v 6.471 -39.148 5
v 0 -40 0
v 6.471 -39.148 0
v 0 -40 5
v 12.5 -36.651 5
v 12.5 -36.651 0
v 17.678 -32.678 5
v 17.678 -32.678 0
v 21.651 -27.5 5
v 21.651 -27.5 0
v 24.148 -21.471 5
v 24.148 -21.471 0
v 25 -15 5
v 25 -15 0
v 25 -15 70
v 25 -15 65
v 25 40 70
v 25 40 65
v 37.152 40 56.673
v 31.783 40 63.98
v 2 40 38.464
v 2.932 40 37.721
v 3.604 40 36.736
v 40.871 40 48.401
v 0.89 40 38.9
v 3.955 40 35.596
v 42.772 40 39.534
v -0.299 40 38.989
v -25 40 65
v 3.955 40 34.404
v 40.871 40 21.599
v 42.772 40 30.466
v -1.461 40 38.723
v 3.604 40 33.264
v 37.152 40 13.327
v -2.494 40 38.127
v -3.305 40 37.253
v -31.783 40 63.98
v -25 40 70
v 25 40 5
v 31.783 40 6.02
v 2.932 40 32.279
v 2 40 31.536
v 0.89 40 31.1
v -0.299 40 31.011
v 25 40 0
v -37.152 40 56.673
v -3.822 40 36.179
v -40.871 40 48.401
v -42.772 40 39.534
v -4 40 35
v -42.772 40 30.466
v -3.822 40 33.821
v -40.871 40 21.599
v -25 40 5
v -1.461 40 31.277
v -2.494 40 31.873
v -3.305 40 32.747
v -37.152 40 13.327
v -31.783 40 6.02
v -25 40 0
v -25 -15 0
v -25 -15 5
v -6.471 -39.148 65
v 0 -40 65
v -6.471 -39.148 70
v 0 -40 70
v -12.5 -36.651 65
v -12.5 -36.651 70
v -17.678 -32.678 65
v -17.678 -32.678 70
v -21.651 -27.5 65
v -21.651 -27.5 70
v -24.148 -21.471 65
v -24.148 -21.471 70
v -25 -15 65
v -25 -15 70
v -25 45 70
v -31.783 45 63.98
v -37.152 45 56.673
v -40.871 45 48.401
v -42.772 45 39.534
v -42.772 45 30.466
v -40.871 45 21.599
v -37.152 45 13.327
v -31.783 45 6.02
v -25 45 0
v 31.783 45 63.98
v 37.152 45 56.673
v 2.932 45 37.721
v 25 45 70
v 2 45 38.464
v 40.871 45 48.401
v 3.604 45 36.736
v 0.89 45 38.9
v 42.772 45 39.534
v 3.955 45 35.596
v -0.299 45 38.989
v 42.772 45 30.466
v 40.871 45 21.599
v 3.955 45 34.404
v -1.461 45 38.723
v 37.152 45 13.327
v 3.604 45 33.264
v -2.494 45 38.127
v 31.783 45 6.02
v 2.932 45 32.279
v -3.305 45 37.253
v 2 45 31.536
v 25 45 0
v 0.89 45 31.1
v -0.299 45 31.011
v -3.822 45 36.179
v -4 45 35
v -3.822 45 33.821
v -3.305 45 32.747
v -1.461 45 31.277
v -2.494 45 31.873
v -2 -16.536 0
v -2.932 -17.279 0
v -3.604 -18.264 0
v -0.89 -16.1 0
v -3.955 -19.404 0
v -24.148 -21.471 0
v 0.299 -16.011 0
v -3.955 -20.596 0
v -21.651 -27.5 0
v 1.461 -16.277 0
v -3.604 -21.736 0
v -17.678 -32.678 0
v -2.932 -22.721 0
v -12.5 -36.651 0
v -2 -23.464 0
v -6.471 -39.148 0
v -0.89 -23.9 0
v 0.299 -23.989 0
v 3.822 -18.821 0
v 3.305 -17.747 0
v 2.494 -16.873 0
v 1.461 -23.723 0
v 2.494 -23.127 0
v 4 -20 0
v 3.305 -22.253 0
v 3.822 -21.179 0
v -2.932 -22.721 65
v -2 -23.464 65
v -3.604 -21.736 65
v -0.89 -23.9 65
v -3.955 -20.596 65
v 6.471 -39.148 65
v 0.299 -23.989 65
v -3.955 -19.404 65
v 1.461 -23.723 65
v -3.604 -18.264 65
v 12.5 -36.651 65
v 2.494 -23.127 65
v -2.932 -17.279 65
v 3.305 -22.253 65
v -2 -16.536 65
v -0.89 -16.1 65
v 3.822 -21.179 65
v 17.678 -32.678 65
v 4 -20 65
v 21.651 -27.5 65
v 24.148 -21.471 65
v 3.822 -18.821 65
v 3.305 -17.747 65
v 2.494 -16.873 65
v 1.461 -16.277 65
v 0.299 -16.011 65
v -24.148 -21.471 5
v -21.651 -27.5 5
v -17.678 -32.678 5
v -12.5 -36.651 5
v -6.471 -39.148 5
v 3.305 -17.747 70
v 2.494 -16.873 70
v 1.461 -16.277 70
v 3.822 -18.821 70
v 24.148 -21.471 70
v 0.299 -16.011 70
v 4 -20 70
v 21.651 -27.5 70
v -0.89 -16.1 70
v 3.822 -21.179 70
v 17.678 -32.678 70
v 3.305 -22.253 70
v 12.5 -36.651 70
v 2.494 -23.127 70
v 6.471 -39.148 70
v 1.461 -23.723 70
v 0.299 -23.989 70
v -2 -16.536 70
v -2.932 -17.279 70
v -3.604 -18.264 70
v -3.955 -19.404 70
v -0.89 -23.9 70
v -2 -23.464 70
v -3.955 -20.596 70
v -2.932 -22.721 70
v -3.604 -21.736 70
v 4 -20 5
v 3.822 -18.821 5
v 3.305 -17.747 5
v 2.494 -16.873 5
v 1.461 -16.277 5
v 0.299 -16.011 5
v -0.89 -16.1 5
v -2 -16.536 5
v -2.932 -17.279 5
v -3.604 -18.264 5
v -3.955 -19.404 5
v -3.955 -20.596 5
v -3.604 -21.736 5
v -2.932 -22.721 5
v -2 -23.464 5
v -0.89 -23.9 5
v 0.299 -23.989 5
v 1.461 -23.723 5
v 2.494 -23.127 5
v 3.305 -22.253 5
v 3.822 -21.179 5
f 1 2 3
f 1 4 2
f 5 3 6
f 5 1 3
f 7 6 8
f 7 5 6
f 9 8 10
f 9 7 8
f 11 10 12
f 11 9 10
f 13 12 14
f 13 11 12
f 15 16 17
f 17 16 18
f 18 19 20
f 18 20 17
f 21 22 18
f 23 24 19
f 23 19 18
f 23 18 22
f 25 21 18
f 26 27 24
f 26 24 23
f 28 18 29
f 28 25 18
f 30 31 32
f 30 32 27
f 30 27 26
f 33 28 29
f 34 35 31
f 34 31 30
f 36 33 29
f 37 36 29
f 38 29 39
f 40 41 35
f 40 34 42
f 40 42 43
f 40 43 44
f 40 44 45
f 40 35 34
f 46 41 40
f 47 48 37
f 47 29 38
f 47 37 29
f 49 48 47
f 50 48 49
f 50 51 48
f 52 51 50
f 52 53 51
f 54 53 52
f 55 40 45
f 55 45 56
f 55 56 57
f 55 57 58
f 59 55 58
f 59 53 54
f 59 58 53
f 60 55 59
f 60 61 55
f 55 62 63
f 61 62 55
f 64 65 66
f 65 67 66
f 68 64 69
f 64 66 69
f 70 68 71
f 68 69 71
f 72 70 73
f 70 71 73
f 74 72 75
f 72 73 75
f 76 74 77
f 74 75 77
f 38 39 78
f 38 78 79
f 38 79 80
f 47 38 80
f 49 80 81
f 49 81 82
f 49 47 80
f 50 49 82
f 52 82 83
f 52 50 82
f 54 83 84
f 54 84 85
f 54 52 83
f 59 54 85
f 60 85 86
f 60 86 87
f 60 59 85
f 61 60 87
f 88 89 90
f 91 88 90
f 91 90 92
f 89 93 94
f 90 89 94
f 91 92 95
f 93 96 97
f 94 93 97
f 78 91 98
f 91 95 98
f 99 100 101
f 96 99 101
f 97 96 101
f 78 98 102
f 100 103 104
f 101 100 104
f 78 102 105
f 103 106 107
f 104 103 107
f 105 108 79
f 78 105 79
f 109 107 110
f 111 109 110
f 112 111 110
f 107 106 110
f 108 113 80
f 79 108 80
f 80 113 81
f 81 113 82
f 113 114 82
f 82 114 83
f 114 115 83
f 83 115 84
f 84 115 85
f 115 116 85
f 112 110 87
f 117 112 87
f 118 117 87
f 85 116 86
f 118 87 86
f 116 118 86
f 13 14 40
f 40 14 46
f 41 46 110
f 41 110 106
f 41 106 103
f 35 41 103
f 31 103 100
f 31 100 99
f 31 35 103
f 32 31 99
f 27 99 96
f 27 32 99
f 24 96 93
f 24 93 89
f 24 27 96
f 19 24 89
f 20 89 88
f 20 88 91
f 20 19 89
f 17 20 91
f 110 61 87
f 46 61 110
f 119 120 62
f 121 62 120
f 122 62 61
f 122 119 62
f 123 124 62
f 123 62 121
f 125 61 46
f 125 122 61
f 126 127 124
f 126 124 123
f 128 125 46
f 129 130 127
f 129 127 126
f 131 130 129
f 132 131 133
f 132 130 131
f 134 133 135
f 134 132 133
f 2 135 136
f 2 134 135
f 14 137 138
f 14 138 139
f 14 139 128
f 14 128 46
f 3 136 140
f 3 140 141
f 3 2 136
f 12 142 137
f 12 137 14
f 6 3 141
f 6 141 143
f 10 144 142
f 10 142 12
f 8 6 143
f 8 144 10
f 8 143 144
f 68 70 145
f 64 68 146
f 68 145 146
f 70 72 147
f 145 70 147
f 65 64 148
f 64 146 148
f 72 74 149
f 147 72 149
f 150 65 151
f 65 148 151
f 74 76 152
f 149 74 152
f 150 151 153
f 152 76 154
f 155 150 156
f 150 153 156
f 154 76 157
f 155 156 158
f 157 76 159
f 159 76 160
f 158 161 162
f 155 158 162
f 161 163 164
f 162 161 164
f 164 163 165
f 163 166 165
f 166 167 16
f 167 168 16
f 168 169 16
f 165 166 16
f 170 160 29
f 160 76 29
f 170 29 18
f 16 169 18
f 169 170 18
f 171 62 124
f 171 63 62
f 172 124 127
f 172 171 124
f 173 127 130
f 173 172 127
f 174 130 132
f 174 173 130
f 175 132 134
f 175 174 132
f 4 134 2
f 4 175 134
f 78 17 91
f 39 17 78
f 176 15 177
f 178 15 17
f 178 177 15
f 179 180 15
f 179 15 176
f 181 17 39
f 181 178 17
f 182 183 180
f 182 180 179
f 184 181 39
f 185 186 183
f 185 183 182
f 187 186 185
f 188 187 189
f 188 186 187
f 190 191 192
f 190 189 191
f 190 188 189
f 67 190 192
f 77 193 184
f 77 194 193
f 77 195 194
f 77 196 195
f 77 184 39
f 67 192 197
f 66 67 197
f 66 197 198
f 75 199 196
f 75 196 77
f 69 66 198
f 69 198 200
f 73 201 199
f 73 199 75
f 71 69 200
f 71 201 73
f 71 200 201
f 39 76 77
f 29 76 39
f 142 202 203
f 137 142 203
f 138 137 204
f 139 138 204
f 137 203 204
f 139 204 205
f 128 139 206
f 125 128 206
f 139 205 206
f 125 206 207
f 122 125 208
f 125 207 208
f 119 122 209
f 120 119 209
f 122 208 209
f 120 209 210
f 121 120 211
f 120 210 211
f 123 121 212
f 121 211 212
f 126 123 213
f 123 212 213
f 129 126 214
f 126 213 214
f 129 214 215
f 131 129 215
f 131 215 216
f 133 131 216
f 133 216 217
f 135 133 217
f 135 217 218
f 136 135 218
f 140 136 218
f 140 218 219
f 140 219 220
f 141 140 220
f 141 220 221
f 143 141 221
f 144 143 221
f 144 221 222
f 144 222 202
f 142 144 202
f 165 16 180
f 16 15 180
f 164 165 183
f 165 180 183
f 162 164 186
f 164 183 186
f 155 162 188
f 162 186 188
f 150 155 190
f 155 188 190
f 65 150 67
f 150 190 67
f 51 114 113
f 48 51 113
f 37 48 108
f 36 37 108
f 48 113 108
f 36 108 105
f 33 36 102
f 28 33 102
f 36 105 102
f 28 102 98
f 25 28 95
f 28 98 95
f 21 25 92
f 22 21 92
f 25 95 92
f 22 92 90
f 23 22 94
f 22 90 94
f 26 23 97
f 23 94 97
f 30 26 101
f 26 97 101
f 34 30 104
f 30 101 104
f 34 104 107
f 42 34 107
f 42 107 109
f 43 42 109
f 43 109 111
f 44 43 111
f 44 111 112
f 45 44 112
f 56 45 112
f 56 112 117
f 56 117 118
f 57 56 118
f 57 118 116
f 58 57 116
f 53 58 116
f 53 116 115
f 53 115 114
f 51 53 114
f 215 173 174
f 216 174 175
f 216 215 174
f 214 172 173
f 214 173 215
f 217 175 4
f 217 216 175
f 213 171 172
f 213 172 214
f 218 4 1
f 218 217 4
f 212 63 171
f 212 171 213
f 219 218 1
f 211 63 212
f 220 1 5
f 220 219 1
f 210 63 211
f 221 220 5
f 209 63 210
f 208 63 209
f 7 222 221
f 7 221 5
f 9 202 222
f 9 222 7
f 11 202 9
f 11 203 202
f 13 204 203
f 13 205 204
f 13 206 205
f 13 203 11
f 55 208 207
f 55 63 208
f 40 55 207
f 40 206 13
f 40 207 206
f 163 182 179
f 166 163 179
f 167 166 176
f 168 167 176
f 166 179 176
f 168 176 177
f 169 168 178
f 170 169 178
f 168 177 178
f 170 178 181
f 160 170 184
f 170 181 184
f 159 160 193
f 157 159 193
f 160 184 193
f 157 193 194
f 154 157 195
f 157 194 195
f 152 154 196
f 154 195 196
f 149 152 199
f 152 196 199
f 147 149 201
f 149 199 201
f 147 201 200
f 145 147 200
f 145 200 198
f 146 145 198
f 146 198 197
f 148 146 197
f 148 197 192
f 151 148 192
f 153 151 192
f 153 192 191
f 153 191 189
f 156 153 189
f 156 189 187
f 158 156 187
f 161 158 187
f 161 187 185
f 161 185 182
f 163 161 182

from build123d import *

# Parameters (mm, degrees)
SKETCH_1_W          = 50
SKETCH_1_H          = 80
EXTRUDE_1_DEPTH     = 5
SKETCH_2_W          = 50
SKETCH_2_H          = 80
EXTRUDE_2_DEPTH     = 5
EXTRUDE_3_DEPTH     = 5
SKETCH_4_R          = 4
CUT_EXTRUDE_1_DEPTH = 94.674969976
SKETCH_5_R          = 4
CUT_EXTRUDE_2_DEPTH = 119.215904175
FILLET_1_R          = 25


with BuildPart() as part:
    # 草图1 → 凸台-拉伸1 (new body)
    with BuildSketch(Plane.XY):
        Rectangle(SKETCH_1_W, SKETCH_1_H)
    extrude(amount=EXTRUDE_1_DEPTH)



with BuildPart() as body_2:
    # 草图2 → 凸台-拉伸2 (new body)
    with BuildSketch(Plane.XY.offset(65)):
        Rectangle(SKETCH_2_W, SKETCH_2_H)
    extrude(amount=EXTRUDE_2_DEPTH)


with BuildPart() as part_1:
    add(part.part)

    add(body_2.part)  # 凸台-拉伸3 merges body 2
    # 草图3 → 凸台-拉伸3 (add)
    with BuildSketch(Plane(origin=(0, 40, 0), x_dir=(1, 0, 0), z_dir=(0, 1, 0))):
        with BuildLine():
            Line((-25, 0), (25, 0))
            ThreePointArc((25, 0), (43.011626335, -35), (25, -70))
            Line((25, -70), (-25, -70))
            ThreePointArc((-25, -70), (-43.011626335, -35), (-25, 0))
        make_face()
    extrude(amount=EXTRUDE_3_DEPTH)

    # 草图4 → 切除-拉伸1 (cut, through all)
    with BuildSketch(Plane.XY.offset(70)):
        with Locations((0, -20)):
            Circle(SKETCH_4_R)
    extrude(amount=-CUT_EXTRUDE_1_DEPTH, mode=Mode.SUBTRACT)

    # 草图5 → 切除-拉伸2 (cut, through all)
    with BuildSketch(Plane(origin=(0, 45, 0), x_dir=(1, 0, 0), z_dir=(0, 1, 0))):
        with Locations(Location((0, -35, 0), (0, 0, 180))):
            Circle(SKETCH_5_R)
    extrude(amount=-CUT_EXTRUDE_2_DEPTH, mode=Mode.SUBTRACT)

    # 圆角1
    fillet_1_edges = [part_1.edges().sort_by_distance(p)[0] for p in [
        (-25, -40, 2.5),
        (25, -40, 2.5),
        (25, -40, 67.5),
        (-25, -40, 67.5),
    ]]
    fillet(fillet_1_edges, radius=FILLET_1_R - 0.0001)  # a hair under: the kernel refuses the full size


solid = part_1.part
